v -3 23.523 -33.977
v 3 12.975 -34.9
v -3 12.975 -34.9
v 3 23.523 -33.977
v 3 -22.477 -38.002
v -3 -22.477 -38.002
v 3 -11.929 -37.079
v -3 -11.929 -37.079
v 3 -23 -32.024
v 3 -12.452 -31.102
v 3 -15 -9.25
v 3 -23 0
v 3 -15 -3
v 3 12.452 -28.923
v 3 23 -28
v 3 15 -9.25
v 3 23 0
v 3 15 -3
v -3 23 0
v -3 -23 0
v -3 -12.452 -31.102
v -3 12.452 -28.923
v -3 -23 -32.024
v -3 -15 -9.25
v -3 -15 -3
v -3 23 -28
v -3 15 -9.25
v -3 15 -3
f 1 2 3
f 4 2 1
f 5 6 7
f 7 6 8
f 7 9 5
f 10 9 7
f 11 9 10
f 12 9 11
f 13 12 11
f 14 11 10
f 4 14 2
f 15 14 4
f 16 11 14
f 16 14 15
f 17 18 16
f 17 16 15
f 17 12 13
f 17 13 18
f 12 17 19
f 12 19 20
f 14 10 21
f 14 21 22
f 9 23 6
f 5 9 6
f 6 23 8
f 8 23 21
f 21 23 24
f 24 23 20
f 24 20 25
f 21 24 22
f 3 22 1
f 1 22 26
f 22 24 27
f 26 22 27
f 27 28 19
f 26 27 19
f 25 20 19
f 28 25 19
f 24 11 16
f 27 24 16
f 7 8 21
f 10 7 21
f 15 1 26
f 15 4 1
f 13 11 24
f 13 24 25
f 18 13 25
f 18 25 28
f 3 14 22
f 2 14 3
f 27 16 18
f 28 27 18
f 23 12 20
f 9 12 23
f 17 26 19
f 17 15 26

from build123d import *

# Parameters (mm, degrees)
F1_DEPTH = 3
F3_DEPTH = 3
F4_W     = 30
F4_H     = 6.25
F5_DEPTH = 6


with BuildPart() as f1:
    # F0 (on Right) → F1 (new body, symmetric)
    with BuildSketch(Plane.YZ):
        Polygon((23, -28), (23, 0), (-23, 0), (-23, -32.024479), align=None)
    extrude(amount=F1_DEPTH, both=True)

    # F2 (on Right) → F3 (join, symmetric)
    with BuildSketch(Plane.YZ):
        Polygon((-23, -32.024479), (-22.477066, -38.001647), (-11.929499, -37.078854), (-12.452434, -31.101686), align=None)
        Polygon((23.522934, -33.977168), (23, -28), (12.452434, -28.922792), (12.975368, -34.899961), align=None)
    extrude(amount=F3_DEPTH, both=True)

    # F4 (on face) → F5 (cut, through all)
    with BuildSketch(Plane.YZ.offset(3)):
        with Locations((0, -6.125)):
            Rectangle(F4_W, F4_H)
    extrude(amount=-F5_DEPTH, mode=Mode.SUBTRACT)


solid = f1.part
